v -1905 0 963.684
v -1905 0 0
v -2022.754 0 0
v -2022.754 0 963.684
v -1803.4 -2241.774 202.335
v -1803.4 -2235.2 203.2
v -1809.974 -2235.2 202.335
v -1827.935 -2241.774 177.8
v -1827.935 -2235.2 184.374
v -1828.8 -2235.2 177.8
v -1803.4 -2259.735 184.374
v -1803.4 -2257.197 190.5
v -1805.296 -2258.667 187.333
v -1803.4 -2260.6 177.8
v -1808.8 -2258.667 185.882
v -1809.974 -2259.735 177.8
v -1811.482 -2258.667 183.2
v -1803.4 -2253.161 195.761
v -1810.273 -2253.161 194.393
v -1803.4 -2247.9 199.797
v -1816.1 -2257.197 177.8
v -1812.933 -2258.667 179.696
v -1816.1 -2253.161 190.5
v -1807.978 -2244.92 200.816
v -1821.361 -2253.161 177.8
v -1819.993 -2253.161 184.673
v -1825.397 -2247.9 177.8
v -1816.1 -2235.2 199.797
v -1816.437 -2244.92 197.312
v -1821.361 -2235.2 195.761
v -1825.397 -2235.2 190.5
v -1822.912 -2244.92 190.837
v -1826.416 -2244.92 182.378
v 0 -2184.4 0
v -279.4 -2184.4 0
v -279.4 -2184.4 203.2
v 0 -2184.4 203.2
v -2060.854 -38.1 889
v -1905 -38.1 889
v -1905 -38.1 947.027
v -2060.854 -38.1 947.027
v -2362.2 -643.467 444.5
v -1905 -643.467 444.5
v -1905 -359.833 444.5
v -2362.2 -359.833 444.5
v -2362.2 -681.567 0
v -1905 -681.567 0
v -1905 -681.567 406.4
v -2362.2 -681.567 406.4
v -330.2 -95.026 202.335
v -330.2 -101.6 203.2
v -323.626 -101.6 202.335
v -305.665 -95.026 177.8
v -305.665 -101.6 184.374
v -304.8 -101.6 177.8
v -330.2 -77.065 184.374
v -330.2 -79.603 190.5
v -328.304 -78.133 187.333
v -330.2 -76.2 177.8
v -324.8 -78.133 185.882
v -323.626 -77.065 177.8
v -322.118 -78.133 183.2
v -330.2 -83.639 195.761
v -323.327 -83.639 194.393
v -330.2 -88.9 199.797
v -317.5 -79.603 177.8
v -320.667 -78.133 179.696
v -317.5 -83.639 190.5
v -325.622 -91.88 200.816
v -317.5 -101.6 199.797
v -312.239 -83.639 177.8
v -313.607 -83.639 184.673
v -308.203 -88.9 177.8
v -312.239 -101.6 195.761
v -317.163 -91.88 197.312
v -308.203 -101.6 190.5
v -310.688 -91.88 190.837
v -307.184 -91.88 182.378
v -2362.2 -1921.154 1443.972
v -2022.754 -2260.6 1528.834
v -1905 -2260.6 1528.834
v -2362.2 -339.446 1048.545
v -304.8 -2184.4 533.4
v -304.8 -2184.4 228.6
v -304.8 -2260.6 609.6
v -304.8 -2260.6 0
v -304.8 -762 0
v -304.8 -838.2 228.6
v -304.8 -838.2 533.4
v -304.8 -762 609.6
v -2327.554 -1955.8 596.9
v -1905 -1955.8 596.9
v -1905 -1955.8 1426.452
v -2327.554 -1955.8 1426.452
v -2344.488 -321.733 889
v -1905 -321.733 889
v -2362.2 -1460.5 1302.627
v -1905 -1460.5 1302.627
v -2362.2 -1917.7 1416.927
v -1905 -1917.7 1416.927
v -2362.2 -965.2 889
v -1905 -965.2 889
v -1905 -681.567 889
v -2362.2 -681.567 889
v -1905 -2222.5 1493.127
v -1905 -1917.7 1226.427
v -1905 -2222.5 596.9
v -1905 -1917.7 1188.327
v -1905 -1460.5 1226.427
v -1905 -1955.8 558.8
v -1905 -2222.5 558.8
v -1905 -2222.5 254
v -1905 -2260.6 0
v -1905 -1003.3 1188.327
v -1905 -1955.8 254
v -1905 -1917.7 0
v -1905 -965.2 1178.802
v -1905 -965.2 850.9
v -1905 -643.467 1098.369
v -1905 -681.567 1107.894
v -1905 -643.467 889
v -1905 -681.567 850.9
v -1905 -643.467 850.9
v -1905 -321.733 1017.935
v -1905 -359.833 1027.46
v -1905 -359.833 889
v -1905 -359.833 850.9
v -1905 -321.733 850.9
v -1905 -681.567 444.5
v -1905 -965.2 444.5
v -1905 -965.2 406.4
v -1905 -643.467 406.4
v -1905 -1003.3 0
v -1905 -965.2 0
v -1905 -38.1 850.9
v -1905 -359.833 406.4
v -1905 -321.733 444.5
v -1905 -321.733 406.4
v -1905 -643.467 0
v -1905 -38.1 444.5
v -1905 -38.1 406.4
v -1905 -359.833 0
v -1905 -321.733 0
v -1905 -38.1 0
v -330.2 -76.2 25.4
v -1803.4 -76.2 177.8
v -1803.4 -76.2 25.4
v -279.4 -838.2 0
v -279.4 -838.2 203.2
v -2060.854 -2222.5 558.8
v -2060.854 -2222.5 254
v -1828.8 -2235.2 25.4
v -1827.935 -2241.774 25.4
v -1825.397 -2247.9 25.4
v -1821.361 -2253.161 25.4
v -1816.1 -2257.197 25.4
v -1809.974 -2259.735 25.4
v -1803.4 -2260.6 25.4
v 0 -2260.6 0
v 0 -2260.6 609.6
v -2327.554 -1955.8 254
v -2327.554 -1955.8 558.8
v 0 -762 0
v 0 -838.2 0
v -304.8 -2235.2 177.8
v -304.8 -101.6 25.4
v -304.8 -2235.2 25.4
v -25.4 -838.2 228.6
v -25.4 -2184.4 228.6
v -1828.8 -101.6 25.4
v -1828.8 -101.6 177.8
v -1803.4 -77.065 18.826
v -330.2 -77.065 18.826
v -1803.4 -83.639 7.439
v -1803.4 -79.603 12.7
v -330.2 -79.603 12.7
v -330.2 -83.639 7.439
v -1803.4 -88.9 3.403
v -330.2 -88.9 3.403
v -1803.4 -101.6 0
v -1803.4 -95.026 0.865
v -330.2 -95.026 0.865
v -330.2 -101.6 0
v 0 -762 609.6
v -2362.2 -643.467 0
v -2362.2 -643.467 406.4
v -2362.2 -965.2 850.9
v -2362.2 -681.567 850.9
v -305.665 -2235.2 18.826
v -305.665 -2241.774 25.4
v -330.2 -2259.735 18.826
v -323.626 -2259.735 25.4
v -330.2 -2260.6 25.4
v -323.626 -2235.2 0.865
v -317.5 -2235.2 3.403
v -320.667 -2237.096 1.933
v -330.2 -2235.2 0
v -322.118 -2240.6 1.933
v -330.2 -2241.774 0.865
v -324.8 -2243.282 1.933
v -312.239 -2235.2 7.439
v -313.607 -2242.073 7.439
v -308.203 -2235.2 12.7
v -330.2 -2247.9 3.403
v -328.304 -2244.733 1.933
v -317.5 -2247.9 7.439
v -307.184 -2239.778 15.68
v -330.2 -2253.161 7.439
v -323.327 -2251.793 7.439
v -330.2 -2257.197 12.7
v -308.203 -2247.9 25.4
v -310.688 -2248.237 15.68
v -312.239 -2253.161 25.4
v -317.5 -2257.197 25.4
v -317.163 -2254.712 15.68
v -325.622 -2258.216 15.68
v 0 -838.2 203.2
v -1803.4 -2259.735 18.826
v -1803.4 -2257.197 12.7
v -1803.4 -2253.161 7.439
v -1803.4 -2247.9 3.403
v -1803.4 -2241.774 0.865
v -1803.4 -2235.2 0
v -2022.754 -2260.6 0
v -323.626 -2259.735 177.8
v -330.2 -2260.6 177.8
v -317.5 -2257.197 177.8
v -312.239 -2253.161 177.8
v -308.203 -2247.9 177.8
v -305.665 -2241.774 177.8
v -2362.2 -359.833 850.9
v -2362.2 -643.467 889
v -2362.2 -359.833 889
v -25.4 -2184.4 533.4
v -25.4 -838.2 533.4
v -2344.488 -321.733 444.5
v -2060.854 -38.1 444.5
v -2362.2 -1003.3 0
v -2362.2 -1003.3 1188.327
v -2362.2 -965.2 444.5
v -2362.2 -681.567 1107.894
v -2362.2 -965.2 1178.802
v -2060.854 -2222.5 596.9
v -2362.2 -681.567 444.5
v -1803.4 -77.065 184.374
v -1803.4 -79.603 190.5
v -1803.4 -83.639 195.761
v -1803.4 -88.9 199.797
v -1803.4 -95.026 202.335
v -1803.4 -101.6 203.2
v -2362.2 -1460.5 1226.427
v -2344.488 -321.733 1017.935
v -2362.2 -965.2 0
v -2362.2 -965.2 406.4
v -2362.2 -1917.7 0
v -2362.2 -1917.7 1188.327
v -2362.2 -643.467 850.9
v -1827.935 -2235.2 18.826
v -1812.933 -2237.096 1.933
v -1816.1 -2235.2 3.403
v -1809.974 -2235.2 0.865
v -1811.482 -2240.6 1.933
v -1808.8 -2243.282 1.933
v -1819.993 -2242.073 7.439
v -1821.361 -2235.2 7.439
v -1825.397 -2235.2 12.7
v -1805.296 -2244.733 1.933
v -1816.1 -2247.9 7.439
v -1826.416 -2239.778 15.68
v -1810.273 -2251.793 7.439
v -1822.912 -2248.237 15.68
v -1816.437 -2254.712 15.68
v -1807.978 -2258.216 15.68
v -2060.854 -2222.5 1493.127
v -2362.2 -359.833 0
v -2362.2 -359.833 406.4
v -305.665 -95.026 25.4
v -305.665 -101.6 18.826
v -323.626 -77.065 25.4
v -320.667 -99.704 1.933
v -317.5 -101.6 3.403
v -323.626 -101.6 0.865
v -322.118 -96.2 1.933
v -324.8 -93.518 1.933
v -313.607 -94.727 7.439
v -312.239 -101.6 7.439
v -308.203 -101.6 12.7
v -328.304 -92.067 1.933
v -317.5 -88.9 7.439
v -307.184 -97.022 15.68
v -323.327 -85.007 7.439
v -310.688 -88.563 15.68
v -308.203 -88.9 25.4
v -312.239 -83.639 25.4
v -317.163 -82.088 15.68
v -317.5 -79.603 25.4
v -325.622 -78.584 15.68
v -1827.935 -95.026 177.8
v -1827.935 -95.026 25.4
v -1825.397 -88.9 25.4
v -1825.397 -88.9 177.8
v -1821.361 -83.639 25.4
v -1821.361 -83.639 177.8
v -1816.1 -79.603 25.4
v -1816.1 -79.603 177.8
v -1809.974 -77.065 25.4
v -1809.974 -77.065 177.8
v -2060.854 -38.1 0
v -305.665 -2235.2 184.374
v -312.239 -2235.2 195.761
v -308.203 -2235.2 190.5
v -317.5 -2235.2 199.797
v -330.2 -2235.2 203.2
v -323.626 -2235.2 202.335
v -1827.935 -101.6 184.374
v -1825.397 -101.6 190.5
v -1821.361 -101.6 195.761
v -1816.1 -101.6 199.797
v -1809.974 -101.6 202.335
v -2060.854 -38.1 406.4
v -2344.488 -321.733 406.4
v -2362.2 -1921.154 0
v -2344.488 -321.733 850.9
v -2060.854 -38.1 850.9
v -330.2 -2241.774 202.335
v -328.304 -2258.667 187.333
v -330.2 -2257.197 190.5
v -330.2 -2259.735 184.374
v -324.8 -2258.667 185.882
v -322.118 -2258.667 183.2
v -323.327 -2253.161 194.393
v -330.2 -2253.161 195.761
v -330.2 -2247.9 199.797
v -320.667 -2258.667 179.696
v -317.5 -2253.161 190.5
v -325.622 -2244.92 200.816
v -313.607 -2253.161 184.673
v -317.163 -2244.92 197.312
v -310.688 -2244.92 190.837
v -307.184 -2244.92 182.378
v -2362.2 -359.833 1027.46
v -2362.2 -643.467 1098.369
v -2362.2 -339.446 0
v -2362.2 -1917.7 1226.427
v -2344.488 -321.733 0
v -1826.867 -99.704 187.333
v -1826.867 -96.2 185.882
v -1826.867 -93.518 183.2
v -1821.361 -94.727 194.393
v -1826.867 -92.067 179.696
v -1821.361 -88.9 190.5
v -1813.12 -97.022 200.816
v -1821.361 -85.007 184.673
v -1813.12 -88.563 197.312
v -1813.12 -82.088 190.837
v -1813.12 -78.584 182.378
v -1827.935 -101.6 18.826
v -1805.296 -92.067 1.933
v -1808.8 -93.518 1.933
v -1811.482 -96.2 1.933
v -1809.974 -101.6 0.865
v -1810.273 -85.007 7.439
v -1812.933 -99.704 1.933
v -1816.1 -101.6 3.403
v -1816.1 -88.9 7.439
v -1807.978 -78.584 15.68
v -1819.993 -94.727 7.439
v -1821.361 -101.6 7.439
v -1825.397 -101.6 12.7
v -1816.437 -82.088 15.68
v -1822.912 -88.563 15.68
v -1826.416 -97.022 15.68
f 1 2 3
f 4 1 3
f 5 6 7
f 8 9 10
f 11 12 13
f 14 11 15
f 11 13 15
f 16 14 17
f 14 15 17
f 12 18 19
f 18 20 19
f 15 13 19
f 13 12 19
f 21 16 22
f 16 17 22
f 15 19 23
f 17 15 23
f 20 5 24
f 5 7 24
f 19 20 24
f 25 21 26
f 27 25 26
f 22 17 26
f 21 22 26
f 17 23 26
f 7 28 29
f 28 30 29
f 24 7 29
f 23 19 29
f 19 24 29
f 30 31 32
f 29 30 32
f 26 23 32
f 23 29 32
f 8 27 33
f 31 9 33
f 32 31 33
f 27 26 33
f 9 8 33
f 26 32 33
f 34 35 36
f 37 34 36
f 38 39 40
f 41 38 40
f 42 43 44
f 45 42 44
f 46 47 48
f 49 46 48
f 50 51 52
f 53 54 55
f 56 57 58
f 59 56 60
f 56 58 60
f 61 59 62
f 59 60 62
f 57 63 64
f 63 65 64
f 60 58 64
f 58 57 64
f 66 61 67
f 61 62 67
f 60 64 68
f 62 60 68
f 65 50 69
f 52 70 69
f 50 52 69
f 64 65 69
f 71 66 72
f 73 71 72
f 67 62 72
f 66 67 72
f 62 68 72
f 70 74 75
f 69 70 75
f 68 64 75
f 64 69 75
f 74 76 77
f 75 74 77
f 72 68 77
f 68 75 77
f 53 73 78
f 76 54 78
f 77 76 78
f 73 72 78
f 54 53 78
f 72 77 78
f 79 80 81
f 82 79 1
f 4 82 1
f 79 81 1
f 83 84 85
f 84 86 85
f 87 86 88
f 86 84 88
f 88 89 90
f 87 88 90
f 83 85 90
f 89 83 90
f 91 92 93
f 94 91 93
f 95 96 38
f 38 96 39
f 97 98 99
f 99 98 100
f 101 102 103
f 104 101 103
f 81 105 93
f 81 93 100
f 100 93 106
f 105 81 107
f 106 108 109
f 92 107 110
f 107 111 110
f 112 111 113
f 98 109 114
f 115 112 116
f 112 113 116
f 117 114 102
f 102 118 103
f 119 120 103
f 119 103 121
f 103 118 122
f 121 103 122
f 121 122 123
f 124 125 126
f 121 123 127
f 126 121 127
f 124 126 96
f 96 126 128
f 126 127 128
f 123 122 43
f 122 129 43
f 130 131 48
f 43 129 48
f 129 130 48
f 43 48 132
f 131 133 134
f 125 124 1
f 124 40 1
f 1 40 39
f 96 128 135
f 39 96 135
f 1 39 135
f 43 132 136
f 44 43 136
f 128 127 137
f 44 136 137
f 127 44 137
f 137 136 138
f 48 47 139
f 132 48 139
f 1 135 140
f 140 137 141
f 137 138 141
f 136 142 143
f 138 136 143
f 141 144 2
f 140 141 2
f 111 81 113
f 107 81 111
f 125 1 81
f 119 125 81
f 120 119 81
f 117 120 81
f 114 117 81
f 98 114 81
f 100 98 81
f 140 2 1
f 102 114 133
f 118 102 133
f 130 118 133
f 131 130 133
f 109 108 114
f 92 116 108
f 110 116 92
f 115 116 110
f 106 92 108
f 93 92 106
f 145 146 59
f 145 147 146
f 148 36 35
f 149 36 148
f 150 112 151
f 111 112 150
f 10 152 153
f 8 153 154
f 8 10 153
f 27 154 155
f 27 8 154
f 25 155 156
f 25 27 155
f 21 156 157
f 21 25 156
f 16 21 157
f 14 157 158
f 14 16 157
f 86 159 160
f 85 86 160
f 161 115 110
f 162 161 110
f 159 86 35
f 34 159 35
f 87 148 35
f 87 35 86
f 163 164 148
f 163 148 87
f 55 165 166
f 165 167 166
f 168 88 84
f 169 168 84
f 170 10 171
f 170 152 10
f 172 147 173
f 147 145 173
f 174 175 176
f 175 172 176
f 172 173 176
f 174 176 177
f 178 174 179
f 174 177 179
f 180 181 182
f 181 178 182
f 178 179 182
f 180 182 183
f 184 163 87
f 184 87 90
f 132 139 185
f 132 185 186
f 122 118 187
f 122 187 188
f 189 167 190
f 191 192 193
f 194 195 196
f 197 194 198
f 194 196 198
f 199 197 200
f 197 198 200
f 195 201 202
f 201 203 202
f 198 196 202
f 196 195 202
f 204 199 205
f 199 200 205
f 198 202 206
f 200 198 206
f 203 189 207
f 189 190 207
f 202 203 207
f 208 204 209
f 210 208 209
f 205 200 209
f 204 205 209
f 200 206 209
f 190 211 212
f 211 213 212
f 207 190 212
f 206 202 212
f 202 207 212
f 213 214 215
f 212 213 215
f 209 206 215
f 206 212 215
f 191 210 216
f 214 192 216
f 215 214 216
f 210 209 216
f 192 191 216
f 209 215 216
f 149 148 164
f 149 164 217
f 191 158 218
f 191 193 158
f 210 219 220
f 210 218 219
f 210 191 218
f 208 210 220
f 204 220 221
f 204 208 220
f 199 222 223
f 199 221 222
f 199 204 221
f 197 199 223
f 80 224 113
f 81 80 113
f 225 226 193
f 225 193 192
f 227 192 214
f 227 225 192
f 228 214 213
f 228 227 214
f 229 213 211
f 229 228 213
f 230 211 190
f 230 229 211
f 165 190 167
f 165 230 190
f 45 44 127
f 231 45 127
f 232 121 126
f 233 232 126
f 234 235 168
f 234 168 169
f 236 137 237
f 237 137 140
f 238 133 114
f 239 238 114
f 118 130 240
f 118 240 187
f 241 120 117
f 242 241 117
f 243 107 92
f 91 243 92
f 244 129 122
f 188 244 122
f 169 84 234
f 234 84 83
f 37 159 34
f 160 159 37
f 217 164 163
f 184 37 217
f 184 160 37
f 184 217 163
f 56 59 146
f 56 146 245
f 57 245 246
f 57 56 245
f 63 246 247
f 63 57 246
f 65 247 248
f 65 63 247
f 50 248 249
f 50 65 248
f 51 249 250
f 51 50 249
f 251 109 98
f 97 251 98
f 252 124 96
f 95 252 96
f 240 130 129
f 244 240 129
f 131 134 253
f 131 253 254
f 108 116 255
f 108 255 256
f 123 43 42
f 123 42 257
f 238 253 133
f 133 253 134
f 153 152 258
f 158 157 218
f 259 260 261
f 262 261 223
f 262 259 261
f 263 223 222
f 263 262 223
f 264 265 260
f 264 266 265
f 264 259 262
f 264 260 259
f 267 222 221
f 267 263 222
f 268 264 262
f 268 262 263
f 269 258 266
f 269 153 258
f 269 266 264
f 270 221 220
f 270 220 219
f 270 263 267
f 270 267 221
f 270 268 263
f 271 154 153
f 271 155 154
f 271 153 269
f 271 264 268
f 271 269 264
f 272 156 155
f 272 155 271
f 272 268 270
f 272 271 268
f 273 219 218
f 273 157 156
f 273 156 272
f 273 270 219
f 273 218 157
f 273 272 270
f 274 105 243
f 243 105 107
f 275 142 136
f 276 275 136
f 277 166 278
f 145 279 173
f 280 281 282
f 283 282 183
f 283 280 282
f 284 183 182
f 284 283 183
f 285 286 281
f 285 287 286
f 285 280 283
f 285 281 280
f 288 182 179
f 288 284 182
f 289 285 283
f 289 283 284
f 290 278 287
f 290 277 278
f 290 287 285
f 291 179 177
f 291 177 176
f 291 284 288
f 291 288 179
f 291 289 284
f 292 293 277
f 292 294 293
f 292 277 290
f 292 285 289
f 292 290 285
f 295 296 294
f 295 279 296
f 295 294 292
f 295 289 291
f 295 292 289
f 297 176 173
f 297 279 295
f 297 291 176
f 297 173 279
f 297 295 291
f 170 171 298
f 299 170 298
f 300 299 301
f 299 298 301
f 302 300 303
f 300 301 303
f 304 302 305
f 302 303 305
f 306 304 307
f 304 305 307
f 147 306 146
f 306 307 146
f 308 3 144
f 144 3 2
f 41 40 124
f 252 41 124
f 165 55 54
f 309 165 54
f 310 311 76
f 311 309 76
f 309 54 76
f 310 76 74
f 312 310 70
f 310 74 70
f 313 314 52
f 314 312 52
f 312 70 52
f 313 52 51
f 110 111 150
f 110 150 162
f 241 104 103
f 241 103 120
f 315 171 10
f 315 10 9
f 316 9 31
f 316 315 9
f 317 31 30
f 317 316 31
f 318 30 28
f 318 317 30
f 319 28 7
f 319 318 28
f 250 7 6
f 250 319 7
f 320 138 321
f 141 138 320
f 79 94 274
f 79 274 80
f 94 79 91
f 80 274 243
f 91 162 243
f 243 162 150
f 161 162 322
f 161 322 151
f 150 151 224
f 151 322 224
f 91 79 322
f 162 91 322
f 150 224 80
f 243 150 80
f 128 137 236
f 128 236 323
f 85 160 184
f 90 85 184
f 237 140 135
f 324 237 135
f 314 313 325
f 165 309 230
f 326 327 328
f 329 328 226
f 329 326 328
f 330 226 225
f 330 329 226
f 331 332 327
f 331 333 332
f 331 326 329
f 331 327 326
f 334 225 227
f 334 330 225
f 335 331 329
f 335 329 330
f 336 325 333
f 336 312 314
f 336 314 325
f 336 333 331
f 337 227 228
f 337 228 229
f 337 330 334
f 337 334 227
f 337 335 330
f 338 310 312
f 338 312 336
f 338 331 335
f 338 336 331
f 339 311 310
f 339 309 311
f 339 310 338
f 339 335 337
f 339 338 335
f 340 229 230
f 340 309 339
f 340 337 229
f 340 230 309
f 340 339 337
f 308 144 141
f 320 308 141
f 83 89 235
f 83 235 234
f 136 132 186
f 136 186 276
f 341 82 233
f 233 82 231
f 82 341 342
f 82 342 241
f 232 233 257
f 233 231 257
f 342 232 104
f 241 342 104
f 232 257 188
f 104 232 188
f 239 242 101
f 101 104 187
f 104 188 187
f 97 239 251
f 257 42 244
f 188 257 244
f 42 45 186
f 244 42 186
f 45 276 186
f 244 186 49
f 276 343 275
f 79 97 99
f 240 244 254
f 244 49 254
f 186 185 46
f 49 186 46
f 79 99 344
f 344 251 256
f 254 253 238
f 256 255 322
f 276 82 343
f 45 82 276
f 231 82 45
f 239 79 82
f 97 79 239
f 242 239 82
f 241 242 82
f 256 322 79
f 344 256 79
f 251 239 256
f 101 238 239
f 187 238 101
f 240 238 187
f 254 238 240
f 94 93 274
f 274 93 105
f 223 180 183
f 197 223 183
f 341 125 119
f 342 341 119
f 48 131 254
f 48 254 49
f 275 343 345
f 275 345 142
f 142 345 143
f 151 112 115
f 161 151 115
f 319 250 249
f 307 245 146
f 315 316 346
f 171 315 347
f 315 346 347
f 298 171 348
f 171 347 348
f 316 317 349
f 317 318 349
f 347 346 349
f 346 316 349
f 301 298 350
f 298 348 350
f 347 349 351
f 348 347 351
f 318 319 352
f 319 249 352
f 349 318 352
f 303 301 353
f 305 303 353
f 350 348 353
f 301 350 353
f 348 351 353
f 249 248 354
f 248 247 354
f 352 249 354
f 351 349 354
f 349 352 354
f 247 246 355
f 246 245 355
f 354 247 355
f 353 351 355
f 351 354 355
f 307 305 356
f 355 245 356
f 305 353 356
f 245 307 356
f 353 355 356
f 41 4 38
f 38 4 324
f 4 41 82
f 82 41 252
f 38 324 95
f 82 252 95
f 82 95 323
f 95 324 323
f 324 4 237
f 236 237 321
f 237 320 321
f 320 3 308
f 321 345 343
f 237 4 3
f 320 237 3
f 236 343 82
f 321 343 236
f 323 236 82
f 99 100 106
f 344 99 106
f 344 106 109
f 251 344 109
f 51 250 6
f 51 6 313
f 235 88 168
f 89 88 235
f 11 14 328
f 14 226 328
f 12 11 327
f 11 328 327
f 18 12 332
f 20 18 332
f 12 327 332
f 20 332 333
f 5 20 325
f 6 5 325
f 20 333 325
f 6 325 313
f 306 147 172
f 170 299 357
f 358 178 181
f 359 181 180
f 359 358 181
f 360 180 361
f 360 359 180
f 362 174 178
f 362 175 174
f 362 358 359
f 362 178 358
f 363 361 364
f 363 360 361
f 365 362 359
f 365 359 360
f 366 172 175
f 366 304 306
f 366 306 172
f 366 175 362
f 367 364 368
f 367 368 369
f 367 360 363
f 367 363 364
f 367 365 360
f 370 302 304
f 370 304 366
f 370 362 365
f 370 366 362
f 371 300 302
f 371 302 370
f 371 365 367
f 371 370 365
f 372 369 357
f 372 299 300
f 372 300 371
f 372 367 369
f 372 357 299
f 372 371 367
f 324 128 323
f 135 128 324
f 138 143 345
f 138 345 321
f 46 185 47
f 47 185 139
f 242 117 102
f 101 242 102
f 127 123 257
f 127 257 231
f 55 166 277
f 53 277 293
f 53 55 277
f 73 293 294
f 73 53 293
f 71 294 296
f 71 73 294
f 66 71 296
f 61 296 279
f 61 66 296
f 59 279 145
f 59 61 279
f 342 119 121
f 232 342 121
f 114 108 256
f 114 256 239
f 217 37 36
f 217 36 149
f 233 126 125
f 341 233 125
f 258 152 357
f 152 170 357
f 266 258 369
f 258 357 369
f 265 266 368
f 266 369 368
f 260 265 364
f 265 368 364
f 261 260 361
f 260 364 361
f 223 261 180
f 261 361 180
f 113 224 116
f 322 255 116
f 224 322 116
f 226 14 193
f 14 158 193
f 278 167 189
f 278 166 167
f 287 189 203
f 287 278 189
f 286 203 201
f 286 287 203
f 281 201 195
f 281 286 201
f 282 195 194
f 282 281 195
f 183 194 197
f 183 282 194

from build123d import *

# Parameters (mm, degrees)
F0_W      = 1498.6
F0_H      = 609.6
F1_DEPTH  = 304.8
F2_W      = 1346.2
F2_H      = 304.8
F3_DEPTH  = 279.4
F4_W      = 1346.2
F4_H      = 203.2
F5_DEPTH  = 279.4
F6_W      = 1524
F6_H      = 2184.4
F7_DEPTH  = 203.2
F9_DEPTH  = 1574.8
F10_R     = 25.4
F12_DEPTH = 457.201
F13_W     = 266.7
F13_H     = 304.8
F13_W_2   = 283.6333333333
F13_H_2   = 406.4
F13_W_3   = 914.4
F13_H_3   = 1188.3268992773
F14_DEPTH = 457.201


with BuildPart() as f1:
    # F0 (on Right) → F1 (new body)
    with BuildSketch(Plane.YZ):
        with Locations((-1511.3, 304.8)):
            Rectangle(F0_W, F0_H)
    extrude(amount=-F1_DEPTH)

    # F2 (on face) → F3 (cut)
    with BuildSketch(Plane(origin=(-304.8, 0, 0), x_dir=(0, -1, 0), z_dir=(-1, 0, 0))):
        with Locations((1511.3, 381)):
            Rectangle(F2_W, F2_H)
    extrude(amount=-F3_DEPTH, mode=Mode.SUBTRACT)

    # F4 (on face) → F5 (cut)
    with BuildSketch(Plane.YZ):
        with Locations((-1511.3, 101.6)):
            Rectangle(F4_W, F4_H)
    extrude(amount=-F5_DEPTH, mode=Mode.SUBTRACT)


with BuildPart() as f7:
    # F6 (on Top) → F7 (new body)
    with BuildSketch(Plane.XY):
        with Locations((-1066.8, -1168.4)):
            Rectangle(F6_W, F6_H)
    extrude(amount=F7_DEPTH)

    # F10
    f10_edges = [f7.edges().sort_by_distance(p)[0] for p in [
        (-304.8, -1168.4, 203.2),
        (-1066.8, -76.2, 203.2),
        (-1828.8, -1168.4, 203.2),
        (-1066.8, -2260.6, 203.2),
        (-1828.8, -2260.6, 101.6),
        (-304.8, -2260.6, 101.6),
        (-304.8, -76.2, 101.6),
        (-1828.8, -76.2, 101.6),
        (-304.8, -1168.4, 0),
        (-1066.8, -76.2, 0),
        (-1828.8, -1168.4, 0),
        (-1066.8, -2260.6, 0),
    ]]
    fillet(f10_edges, radius=F10_R)


with BuildPart() as f9:
    # F8 (on Top) → F9 (new body)
    with BuildSketch(Plane.XY):
        Polygon((-1905, -2260.6), (-1905, 0), (-2022.7544, 0), (-2362.2, -339.4456), (-2362.2, -1921.1544), (-2022.7544, -2260.6), align=None)
    extrude(amount=F9_DEPTH)

    # F11 (on face) → F12 (cut, through all)
    with BuildSketch(Plane.YZ.offset(-1905)):
        Polygon((-2260.6, 1574.8), (-2260.6, 1528.83362), (0, 963.68362), (0, 1574.8), align=None)
    extrude(amount=-F12_DEPTH, mode=Mode.SUBTRACT)

    # F13 (on face) → F14 (cut, through all)
    with BuildSketch(Plane.YZ.offset(-1905)):
        with Locations((-2089.15, 406.4)):
            Rectangle(F13_W, F13_H)
        Polygon((-2222.5, 1493.1268992773), (-2222.5, 596.9), (-1955.8, 596.9), (-1955.8, 1426.4518992773), align=None)
        Polygon((-38.1, 947.0268992773), (-321.7333333333, 1017.9352326107), (-321.7333333333, 889), (-38.1, 889), align=None)
        with Locations((-179.9166666667, 647.7)):
            Rectangle(F13_W_2, F13_H_2)
        with Locations((-179.9166666667, 203.2)):
            Rectangle(F13_W_2, F13_H_2)
        with Locations((-1460.5, 594.1634496387)):
            Rectangle(F13_W_3, F13_H_3)
        with Locations((-501.65, 203.2)):
            Rectangle(F13_W_2, F13_H_2)
        with Locations((-823.3833333333, 203.2)):
            Rectangle(F13_W_2, F13_H_2)
        with Locations((-501.65, 647.7)):
            Rectangle(F13_W_2, F13_H_2)
        with Locations((-823.3833333333, 647.7)):
            Rectangle(F13_W_2, F13_H_2)
        Polygon((-643.4666666667, 889), (-359.8333333333, 889), (-359.8333333333, 1027.4602326107), (-643.4666666667, 1098.368565944), align=None)
        Polygon((-965.2, 889), (-681.5666666667, 889), (-681.5666666667, 1107.893565944), (-965.2, 1178.8018992773), align=None)
        Polygon((-1917.7, 1416.9268992773), (-1917.7, 1226.4268992773), (-1460.5, 1226.4268992773), (-1460.5, 1302.6268992773), align=None)
    extrude(amount=-F14_DEPTH, mode=Mode.SUBTRACT)


solid = Compound([f1.part, f7.part, f9.part])
